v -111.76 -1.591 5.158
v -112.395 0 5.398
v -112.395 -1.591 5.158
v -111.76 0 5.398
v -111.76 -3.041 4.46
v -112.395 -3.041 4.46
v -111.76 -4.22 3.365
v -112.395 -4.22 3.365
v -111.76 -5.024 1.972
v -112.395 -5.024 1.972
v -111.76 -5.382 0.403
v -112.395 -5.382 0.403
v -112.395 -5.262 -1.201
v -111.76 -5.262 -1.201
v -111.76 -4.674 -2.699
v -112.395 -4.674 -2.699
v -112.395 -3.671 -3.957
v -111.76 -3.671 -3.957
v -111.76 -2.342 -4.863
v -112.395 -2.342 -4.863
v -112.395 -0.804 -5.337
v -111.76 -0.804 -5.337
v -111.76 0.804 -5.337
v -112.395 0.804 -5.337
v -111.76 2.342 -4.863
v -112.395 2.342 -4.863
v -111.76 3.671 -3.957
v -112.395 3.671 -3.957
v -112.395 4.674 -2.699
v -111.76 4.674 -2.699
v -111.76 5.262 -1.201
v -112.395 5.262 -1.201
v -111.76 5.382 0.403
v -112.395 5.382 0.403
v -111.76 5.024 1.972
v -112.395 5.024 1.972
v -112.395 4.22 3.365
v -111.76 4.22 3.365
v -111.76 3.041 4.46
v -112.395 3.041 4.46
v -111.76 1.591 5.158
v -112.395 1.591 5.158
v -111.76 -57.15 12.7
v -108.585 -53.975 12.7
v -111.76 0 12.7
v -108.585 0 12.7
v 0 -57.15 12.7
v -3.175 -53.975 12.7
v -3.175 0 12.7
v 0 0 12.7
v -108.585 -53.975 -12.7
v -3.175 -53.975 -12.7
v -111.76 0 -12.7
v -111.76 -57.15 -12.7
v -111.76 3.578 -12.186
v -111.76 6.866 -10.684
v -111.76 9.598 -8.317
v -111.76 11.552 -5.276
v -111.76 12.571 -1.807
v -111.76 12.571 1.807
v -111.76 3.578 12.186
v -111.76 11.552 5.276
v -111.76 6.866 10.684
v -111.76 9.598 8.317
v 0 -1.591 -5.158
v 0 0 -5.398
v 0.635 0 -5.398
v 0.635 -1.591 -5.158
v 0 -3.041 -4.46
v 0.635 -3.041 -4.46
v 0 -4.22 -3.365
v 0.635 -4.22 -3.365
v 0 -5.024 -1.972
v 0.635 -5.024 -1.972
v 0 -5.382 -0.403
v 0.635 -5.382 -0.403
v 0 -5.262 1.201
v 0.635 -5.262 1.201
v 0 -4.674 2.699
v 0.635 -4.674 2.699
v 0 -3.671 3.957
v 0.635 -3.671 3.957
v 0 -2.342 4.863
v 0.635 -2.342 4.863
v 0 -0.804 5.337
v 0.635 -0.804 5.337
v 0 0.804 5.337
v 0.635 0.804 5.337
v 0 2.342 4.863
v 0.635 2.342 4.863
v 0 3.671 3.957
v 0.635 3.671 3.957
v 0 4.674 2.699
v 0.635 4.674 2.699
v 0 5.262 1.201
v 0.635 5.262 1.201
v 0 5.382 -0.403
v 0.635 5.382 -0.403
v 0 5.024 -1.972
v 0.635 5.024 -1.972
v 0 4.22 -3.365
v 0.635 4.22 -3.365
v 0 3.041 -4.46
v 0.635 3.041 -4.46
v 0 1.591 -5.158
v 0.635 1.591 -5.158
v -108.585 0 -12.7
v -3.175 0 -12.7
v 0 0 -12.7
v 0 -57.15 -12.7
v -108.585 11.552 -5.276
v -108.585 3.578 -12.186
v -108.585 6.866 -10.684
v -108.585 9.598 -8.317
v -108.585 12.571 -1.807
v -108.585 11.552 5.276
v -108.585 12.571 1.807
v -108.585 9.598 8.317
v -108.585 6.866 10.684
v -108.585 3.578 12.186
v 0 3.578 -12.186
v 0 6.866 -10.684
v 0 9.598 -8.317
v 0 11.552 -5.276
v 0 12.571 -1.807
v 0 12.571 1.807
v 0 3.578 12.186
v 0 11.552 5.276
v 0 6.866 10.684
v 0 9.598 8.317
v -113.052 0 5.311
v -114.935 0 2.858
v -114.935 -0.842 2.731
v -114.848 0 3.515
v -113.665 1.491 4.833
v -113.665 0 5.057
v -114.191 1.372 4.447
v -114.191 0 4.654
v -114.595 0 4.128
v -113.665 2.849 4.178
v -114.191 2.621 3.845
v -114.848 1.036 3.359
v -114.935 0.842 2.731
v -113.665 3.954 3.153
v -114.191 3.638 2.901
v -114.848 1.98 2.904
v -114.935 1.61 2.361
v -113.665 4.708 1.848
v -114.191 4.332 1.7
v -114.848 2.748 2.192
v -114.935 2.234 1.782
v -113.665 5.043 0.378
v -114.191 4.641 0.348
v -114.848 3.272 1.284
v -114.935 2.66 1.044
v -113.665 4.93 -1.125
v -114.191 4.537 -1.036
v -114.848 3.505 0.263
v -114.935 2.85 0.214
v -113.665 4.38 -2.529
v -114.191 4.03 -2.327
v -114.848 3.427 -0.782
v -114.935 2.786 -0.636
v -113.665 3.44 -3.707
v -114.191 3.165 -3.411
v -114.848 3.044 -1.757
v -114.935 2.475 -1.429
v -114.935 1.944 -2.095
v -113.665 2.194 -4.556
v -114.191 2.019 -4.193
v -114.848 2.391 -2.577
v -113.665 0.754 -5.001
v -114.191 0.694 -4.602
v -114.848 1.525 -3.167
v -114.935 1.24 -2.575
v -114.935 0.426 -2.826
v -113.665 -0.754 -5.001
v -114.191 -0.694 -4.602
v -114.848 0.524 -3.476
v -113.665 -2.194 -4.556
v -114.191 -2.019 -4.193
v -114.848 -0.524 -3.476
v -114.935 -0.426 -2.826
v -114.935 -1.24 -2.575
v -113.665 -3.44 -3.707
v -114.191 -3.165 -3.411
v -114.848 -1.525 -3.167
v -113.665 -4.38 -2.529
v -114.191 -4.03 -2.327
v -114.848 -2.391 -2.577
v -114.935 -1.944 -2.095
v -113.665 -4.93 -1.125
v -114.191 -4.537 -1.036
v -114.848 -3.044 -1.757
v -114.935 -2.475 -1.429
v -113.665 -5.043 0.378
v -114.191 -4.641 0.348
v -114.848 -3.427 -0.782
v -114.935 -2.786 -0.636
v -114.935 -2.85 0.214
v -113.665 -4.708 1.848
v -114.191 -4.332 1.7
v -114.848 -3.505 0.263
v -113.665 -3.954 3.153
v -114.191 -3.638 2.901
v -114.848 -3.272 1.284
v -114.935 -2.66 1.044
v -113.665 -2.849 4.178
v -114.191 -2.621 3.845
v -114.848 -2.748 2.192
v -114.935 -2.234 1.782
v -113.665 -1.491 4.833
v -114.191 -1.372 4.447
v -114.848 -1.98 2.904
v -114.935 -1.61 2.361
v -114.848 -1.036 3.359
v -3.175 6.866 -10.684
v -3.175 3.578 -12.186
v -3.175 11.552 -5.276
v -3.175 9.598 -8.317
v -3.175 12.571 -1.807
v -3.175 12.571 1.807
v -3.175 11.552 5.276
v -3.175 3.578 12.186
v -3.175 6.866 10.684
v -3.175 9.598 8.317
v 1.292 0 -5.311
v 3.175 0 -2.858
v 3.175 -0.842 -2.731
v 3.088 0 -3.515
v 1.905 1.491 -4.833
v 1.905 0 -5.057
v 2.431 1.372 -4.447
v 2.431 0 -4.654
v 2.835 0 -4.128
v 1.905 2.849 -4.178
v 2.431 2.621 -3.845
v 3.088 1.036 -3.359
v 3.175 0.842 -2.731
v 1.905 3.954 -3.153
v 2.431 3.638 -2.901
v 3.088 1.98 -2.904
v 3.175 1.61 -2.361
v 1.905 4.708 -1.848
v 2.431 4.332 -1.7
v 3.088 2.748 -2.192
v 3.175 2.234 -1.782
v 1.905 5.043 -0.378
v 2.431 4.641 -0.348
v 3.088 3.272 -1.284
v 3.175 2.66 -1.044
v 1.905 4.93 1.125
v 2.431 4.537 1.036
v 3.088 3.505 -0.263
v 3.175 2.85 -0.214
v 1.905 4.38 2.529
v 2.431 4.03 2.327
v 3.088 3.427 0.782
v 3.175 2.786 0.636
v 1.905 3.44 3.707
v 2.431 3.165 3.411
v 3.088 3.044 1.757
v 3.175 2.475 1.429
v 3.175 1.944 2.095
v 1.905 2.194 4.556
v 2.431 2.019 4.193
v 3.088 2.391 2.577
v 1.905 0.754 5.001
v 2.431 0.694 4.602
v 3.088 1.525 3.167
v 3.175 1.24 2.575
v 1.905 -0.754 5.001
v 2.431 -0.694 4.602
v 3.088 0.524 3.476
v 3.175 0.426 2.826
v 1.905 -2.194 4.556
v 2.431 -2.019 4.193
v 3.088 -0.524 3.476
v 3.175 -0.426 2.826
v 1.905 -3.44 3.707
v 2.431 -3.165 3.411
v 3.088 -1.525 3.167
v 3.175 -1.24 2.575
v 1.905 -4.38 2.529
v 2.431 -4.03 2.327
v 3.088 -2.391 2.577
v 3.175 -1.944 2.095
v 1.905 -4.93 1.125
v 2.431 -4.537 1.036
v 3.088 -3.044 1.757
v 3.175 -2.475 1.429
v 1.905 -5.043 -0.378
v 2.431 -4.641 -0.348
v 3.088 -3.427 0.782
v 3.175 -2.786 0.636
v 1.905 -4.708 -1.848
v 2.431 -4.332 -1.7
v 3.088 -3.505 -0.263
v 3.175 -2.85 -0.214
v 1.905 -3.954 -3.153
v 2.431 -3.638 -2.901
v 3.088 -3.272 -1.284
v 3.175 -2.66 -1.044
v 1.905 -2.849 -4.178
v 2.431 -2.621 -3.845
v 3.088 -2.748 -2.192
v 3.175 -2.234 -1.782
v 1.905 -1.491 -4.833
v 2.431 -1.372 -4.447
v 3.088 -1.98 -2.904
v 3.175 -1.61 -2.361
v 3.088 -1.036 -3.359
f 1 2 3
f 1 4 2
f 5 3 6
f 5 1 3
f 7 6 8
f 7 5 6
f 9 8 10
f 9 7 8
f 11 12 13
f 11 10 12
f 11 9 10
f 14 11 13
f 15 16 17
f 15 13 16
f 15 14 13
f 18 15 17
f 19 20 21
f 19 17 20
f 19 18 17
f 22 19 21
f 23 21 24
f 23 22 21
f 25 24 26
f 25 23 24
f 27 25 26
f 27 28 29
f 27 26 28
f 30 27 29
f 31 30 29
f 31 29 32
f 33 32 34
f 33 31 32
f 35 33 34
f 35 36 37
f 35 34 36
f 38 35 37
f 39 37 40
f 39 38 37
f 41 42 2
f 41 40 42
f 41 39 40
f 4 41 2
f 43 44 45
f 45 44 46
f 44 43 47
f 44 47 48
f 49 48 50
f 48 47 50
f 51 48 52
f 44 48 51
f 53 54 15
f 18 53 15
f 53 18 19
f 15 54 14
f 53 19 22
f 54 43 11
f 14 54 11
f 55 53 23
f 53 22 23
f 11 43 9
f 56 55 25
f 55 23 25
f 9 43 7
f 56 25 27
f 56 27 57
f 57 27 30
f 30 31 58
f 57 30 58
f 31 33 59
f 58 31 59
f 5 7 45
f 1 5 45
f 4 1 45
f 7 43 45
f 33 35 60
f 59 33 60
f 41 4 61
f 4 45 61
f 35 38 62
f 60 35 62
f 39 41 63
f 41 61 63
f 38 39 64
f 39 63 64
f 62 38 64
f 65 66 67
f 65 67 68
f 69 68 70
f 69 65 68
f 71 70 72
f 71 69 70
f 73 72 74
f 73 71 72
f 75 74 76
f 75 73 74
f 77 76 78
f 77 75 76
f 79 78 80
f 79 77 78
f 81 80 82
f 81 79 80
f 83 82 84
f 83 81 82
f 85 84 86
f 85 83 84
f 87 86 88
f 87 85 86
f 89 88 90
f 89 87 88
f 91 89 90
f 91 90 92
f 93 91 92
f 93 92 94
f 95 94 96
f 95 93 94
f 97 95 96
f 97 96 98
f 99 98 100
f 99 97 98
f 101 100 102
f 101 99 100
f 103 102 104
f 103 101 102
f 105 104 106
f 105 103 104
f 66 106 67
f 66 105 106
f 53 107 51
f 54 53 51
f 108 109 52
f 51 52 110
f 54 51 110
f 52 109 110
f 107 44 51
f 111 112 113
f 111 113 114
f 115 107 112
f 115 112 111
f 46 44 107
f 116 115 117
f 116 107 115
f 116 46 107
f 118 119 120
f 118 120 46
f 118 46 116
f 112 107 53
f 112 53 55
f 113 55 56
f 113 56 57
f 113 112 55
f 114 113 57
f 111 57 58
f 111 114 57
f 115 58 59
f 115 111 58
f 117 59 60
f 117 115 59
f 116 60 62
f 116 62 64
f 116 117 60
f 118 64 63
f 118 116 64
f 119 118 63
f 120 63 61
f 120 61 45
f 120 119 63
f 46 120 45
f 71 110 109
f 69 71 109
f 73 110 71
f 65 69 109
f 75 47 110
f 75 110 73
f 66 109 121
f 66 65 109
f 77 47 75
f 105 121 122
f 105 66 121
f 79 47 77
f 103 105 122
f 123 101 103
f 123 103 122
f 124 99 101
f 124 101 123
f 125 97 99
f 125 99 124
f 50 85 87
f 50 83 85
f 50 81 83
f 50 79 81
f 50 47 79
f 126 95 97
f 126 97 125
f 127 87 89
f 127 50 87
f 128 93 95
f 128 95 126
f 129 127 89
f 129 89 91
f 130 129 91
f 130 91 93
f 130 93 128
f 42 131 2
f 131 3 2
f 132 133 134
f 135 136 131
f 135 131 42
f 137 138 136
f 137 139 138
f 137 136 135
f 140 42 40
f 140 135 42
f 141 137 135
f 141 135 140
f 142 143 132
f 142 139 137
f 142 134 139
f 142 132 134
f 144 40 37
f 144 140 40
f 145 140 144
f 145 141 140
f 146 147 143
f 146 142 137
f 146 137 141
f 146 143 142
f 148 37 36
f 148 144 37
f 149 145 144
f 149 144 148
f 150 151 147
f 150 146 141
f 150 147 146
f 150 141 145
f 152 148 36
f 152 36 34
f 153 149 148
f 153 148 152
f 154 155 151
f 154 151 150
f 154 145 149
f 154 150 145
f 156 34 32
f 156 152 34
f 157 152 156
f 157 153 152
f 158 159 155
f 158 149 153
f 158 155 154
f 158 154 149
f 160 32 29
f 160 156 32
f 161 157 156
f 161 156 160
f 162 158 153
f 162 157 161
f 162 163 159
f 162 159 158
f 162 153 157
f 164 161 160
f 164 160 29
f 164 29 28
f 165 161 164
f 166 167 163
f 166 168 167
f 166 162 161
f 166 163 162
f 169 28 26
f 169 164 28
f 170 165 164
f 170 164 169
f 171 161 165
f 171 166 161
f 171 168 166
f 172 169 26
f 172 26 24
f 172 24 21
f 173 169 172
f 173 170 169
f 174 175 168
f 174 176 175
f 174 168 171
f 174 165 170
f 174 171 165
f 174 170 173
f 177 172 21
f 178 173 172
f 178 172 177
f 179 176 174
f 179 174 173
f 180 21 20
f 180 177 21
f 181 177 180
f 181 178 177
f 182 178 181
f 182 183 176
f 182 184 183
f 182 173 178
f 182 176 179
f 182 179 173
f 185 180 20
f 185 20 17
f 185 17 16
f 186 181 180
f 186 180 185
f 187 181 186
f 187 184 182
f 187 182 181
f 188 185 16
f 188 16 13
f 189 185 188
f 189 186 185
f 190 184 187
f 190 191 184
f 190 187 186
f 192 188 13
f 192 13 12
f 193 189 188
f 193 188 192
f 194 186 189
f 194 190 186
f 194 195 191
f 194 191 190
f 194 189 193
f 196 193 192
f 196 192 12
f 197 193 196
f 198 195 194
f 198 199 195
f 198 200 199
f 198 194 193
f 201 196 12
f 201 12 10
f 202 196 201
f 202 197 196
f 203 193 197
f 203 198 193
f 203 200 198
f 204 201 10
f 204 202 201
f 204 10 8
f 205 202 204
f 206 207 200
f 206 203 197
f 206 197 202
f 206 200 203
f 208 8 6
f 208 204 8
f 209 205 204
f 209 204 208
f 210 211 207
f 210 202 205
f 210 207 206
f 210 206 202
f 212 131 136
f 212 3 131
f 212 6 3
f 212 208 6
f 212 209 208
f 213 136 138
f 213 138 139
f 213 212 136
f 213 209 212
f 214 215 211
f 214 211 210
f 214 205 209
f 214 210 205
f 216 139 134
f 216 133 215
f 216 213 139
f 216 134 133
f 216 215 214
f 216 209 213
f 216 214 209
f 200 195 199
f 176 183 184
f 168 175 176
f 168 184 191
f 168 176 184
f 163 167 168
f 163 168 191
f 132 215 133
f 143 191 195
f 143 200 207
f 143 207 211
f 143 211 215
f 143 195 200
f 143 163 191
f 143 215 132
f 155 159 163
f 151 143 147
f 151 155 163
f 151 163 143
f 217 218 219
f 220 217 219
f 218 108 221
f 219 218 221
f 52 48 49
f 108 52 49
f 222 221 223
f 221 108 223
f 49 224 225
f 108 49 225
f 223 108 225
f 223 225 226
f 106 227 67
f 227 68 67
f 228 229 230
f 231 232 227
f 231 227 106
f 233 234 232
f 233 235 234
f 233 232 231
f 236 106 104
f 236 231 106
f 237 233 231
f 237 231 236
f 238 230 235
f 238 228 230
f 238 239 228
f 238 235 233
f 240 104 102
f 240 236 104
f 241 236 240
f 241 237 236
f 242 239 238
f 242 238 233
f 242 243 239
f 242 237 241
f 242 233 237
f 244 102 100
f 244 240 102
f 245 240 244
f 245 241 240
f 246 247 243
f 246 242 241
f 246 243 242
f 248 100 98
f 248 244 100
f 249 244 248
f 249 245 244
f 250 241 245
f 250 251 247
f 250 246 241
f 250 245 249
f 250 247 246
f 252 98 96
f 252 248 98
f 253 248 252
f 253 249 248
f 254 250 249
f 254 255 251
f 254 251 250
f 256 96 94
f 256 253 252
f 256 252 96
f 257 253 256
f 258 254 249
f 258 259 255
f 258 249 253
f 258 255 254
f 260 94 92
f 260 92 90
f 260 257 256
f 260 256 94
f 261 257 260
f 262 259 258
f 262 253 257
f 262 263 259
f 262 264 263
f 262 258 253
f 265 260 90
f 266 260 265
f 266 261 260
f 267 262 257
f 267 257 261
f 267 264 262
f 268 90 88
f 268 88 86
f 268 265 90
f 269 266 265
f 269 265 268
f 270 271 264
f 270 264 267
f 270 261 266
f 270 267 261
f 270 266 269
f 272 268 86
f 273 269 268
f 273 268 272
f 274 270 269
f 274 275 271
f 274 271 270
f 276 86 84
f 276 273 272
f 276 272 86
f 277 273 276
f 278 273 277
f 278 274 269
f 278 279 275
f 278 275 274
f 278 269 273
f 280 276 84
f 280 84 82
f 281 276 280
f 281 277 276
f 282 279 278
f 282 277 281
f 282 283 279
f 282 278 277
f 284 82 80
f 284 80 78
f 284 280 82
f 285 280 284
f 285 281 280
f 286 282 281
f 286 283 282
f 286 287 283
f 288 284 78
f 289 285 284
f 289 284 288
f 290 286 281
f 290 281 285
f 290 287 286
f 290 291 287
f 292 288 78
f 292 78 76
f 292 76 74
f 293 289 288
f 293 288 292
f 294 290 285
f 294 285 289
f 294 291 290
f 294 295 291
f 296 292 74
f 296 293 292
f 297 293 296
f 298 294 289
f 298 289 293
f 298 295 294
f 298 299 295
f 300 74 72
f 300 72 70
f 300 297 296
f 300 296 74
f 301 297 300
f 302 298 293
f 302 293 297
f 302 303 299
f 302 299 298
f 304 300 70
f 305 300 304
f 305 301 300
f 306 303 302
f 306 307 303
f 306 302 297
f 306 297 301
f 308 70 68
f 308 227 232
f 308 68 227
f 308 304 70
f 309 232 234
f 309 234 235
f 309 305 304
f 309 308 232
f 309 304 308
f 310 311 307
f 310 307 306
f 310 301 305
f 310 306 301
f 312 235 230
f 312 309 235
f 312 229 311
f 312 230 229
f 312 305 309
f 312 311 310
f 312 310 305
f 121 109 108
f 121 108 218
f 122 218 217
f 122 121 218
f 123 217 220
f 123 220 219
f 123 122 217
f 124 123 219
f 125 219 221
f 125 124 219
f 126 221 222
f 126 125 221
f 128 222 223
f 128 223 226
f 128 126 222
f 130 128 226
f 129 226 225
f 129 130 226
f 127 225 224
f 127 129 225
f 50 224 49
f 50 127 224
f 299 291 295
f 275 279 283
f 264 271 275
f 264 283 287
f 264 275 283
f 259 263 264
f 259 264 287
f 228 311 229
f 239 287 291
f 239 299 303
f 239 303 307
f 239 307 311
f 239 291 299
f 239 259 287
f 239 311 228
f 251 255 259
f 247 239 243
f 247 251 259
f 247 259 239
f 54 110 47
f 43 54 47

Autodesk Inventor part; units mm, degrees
ref_plane "YZ Plane" through (0, 0, 0) normal (1, 0, 0) x (0, 1, 0)
ref_plane "XZ Plane" through (0, 0, 0) normal (0, 1, 0) x (-1, 0, 0)
ref_plane "XY Plane" through (0, 0, 0) normal (0, 0, 1) x (1, 0, 0)
sketch "Sketch1" plane through (0, 0, 0) normal (1, 0, 0) x (0, 1, 0)
  arc A0 (0, -12.7) -> (0, 12.7) centre (0, 0) ccw
  line L0 (0, -12.7) -> (-57.15, -12.7)
  line L1 (-57.15, -12.7) -> (-57.15, 12.7)
  line L2 (-57.15, 12.7) -> (0, 12.7)
  dimension "d0" = 25.4
  dimension "d1" = 57.15
extrude "Extrusion1" add sketch "Sketch1" against normal blind 111.76
sketch "Sketch2" plane through (0, -57.15, 12.7) normal (0, 0, 1) x (1, 0, 0)
  line L0 (0, 57.15) -> (0, 0) projected
  line L1 (0, 57.15) -> (-111.76, 57.15) projected
  line L2 (-111.76, 0) -> (-111.76, 57.15) projected
  line L3 (0, 0) -> (-111.76, 0) projected
  line L4 (-108.585, 3.175) -> (-108.585, 53.975)
  line L5 (-108.585, 53.975) -> (-3.175, 53.975)
  line L6 (-3.175, 53.975) -> (-3.175, 3.175)
  line L7 (-3.175, 3.175) -> (-108.585, 3.175)
  line L8 (-108.585, 53.975) -> (-108.585, 116.1509)
  line L9 (-108.585, 116.1509) -> (-5.0285, 113.469)
  line L10 (-3.175, 53.975) -> (-3.175, 108.1053)
  line L11 (-3.175, 108.1053) -> (-18.8552, 122.8908)
  point P0 (-8.9715, 113.5711)
  dimension "d4" = 3.175
extrude "Extrusion2" cut sketch "Sketch2" against normal blind 111.76 contours L10 L5 L8 L1 | L1 L8 L9 L11 L10 | L6 L7 L4 L5
sketch "Sketch3" plane through (0, 0, 0) normal (1, 0, 0) x (0, 0, -1)
  circle A0 centre (0, 0) radius 5.3975
  dimension "d7" = 10.795
sketch "Sketch4" plane through (-111.76, 0, 0) normal (-1, 0, 0) x (0, 0, 1)
  circle A0 centre (0, 0) radius 5.3975
  dimension "d8" = 10.795
extrude "Extrusion3" add sketch "Sketch4" along normal blind 3.175
fillet "Fillet1" radius 2.54 1 edges at (-114.935, 0, -5.3975)
extrude "Extrusion4" add sketch "Sketch3" along normal blind 3.175
fillet "Fillet2" radius 2.54 1 edges at (3.175, 0, 5.3975)
properties part number "box bot"
